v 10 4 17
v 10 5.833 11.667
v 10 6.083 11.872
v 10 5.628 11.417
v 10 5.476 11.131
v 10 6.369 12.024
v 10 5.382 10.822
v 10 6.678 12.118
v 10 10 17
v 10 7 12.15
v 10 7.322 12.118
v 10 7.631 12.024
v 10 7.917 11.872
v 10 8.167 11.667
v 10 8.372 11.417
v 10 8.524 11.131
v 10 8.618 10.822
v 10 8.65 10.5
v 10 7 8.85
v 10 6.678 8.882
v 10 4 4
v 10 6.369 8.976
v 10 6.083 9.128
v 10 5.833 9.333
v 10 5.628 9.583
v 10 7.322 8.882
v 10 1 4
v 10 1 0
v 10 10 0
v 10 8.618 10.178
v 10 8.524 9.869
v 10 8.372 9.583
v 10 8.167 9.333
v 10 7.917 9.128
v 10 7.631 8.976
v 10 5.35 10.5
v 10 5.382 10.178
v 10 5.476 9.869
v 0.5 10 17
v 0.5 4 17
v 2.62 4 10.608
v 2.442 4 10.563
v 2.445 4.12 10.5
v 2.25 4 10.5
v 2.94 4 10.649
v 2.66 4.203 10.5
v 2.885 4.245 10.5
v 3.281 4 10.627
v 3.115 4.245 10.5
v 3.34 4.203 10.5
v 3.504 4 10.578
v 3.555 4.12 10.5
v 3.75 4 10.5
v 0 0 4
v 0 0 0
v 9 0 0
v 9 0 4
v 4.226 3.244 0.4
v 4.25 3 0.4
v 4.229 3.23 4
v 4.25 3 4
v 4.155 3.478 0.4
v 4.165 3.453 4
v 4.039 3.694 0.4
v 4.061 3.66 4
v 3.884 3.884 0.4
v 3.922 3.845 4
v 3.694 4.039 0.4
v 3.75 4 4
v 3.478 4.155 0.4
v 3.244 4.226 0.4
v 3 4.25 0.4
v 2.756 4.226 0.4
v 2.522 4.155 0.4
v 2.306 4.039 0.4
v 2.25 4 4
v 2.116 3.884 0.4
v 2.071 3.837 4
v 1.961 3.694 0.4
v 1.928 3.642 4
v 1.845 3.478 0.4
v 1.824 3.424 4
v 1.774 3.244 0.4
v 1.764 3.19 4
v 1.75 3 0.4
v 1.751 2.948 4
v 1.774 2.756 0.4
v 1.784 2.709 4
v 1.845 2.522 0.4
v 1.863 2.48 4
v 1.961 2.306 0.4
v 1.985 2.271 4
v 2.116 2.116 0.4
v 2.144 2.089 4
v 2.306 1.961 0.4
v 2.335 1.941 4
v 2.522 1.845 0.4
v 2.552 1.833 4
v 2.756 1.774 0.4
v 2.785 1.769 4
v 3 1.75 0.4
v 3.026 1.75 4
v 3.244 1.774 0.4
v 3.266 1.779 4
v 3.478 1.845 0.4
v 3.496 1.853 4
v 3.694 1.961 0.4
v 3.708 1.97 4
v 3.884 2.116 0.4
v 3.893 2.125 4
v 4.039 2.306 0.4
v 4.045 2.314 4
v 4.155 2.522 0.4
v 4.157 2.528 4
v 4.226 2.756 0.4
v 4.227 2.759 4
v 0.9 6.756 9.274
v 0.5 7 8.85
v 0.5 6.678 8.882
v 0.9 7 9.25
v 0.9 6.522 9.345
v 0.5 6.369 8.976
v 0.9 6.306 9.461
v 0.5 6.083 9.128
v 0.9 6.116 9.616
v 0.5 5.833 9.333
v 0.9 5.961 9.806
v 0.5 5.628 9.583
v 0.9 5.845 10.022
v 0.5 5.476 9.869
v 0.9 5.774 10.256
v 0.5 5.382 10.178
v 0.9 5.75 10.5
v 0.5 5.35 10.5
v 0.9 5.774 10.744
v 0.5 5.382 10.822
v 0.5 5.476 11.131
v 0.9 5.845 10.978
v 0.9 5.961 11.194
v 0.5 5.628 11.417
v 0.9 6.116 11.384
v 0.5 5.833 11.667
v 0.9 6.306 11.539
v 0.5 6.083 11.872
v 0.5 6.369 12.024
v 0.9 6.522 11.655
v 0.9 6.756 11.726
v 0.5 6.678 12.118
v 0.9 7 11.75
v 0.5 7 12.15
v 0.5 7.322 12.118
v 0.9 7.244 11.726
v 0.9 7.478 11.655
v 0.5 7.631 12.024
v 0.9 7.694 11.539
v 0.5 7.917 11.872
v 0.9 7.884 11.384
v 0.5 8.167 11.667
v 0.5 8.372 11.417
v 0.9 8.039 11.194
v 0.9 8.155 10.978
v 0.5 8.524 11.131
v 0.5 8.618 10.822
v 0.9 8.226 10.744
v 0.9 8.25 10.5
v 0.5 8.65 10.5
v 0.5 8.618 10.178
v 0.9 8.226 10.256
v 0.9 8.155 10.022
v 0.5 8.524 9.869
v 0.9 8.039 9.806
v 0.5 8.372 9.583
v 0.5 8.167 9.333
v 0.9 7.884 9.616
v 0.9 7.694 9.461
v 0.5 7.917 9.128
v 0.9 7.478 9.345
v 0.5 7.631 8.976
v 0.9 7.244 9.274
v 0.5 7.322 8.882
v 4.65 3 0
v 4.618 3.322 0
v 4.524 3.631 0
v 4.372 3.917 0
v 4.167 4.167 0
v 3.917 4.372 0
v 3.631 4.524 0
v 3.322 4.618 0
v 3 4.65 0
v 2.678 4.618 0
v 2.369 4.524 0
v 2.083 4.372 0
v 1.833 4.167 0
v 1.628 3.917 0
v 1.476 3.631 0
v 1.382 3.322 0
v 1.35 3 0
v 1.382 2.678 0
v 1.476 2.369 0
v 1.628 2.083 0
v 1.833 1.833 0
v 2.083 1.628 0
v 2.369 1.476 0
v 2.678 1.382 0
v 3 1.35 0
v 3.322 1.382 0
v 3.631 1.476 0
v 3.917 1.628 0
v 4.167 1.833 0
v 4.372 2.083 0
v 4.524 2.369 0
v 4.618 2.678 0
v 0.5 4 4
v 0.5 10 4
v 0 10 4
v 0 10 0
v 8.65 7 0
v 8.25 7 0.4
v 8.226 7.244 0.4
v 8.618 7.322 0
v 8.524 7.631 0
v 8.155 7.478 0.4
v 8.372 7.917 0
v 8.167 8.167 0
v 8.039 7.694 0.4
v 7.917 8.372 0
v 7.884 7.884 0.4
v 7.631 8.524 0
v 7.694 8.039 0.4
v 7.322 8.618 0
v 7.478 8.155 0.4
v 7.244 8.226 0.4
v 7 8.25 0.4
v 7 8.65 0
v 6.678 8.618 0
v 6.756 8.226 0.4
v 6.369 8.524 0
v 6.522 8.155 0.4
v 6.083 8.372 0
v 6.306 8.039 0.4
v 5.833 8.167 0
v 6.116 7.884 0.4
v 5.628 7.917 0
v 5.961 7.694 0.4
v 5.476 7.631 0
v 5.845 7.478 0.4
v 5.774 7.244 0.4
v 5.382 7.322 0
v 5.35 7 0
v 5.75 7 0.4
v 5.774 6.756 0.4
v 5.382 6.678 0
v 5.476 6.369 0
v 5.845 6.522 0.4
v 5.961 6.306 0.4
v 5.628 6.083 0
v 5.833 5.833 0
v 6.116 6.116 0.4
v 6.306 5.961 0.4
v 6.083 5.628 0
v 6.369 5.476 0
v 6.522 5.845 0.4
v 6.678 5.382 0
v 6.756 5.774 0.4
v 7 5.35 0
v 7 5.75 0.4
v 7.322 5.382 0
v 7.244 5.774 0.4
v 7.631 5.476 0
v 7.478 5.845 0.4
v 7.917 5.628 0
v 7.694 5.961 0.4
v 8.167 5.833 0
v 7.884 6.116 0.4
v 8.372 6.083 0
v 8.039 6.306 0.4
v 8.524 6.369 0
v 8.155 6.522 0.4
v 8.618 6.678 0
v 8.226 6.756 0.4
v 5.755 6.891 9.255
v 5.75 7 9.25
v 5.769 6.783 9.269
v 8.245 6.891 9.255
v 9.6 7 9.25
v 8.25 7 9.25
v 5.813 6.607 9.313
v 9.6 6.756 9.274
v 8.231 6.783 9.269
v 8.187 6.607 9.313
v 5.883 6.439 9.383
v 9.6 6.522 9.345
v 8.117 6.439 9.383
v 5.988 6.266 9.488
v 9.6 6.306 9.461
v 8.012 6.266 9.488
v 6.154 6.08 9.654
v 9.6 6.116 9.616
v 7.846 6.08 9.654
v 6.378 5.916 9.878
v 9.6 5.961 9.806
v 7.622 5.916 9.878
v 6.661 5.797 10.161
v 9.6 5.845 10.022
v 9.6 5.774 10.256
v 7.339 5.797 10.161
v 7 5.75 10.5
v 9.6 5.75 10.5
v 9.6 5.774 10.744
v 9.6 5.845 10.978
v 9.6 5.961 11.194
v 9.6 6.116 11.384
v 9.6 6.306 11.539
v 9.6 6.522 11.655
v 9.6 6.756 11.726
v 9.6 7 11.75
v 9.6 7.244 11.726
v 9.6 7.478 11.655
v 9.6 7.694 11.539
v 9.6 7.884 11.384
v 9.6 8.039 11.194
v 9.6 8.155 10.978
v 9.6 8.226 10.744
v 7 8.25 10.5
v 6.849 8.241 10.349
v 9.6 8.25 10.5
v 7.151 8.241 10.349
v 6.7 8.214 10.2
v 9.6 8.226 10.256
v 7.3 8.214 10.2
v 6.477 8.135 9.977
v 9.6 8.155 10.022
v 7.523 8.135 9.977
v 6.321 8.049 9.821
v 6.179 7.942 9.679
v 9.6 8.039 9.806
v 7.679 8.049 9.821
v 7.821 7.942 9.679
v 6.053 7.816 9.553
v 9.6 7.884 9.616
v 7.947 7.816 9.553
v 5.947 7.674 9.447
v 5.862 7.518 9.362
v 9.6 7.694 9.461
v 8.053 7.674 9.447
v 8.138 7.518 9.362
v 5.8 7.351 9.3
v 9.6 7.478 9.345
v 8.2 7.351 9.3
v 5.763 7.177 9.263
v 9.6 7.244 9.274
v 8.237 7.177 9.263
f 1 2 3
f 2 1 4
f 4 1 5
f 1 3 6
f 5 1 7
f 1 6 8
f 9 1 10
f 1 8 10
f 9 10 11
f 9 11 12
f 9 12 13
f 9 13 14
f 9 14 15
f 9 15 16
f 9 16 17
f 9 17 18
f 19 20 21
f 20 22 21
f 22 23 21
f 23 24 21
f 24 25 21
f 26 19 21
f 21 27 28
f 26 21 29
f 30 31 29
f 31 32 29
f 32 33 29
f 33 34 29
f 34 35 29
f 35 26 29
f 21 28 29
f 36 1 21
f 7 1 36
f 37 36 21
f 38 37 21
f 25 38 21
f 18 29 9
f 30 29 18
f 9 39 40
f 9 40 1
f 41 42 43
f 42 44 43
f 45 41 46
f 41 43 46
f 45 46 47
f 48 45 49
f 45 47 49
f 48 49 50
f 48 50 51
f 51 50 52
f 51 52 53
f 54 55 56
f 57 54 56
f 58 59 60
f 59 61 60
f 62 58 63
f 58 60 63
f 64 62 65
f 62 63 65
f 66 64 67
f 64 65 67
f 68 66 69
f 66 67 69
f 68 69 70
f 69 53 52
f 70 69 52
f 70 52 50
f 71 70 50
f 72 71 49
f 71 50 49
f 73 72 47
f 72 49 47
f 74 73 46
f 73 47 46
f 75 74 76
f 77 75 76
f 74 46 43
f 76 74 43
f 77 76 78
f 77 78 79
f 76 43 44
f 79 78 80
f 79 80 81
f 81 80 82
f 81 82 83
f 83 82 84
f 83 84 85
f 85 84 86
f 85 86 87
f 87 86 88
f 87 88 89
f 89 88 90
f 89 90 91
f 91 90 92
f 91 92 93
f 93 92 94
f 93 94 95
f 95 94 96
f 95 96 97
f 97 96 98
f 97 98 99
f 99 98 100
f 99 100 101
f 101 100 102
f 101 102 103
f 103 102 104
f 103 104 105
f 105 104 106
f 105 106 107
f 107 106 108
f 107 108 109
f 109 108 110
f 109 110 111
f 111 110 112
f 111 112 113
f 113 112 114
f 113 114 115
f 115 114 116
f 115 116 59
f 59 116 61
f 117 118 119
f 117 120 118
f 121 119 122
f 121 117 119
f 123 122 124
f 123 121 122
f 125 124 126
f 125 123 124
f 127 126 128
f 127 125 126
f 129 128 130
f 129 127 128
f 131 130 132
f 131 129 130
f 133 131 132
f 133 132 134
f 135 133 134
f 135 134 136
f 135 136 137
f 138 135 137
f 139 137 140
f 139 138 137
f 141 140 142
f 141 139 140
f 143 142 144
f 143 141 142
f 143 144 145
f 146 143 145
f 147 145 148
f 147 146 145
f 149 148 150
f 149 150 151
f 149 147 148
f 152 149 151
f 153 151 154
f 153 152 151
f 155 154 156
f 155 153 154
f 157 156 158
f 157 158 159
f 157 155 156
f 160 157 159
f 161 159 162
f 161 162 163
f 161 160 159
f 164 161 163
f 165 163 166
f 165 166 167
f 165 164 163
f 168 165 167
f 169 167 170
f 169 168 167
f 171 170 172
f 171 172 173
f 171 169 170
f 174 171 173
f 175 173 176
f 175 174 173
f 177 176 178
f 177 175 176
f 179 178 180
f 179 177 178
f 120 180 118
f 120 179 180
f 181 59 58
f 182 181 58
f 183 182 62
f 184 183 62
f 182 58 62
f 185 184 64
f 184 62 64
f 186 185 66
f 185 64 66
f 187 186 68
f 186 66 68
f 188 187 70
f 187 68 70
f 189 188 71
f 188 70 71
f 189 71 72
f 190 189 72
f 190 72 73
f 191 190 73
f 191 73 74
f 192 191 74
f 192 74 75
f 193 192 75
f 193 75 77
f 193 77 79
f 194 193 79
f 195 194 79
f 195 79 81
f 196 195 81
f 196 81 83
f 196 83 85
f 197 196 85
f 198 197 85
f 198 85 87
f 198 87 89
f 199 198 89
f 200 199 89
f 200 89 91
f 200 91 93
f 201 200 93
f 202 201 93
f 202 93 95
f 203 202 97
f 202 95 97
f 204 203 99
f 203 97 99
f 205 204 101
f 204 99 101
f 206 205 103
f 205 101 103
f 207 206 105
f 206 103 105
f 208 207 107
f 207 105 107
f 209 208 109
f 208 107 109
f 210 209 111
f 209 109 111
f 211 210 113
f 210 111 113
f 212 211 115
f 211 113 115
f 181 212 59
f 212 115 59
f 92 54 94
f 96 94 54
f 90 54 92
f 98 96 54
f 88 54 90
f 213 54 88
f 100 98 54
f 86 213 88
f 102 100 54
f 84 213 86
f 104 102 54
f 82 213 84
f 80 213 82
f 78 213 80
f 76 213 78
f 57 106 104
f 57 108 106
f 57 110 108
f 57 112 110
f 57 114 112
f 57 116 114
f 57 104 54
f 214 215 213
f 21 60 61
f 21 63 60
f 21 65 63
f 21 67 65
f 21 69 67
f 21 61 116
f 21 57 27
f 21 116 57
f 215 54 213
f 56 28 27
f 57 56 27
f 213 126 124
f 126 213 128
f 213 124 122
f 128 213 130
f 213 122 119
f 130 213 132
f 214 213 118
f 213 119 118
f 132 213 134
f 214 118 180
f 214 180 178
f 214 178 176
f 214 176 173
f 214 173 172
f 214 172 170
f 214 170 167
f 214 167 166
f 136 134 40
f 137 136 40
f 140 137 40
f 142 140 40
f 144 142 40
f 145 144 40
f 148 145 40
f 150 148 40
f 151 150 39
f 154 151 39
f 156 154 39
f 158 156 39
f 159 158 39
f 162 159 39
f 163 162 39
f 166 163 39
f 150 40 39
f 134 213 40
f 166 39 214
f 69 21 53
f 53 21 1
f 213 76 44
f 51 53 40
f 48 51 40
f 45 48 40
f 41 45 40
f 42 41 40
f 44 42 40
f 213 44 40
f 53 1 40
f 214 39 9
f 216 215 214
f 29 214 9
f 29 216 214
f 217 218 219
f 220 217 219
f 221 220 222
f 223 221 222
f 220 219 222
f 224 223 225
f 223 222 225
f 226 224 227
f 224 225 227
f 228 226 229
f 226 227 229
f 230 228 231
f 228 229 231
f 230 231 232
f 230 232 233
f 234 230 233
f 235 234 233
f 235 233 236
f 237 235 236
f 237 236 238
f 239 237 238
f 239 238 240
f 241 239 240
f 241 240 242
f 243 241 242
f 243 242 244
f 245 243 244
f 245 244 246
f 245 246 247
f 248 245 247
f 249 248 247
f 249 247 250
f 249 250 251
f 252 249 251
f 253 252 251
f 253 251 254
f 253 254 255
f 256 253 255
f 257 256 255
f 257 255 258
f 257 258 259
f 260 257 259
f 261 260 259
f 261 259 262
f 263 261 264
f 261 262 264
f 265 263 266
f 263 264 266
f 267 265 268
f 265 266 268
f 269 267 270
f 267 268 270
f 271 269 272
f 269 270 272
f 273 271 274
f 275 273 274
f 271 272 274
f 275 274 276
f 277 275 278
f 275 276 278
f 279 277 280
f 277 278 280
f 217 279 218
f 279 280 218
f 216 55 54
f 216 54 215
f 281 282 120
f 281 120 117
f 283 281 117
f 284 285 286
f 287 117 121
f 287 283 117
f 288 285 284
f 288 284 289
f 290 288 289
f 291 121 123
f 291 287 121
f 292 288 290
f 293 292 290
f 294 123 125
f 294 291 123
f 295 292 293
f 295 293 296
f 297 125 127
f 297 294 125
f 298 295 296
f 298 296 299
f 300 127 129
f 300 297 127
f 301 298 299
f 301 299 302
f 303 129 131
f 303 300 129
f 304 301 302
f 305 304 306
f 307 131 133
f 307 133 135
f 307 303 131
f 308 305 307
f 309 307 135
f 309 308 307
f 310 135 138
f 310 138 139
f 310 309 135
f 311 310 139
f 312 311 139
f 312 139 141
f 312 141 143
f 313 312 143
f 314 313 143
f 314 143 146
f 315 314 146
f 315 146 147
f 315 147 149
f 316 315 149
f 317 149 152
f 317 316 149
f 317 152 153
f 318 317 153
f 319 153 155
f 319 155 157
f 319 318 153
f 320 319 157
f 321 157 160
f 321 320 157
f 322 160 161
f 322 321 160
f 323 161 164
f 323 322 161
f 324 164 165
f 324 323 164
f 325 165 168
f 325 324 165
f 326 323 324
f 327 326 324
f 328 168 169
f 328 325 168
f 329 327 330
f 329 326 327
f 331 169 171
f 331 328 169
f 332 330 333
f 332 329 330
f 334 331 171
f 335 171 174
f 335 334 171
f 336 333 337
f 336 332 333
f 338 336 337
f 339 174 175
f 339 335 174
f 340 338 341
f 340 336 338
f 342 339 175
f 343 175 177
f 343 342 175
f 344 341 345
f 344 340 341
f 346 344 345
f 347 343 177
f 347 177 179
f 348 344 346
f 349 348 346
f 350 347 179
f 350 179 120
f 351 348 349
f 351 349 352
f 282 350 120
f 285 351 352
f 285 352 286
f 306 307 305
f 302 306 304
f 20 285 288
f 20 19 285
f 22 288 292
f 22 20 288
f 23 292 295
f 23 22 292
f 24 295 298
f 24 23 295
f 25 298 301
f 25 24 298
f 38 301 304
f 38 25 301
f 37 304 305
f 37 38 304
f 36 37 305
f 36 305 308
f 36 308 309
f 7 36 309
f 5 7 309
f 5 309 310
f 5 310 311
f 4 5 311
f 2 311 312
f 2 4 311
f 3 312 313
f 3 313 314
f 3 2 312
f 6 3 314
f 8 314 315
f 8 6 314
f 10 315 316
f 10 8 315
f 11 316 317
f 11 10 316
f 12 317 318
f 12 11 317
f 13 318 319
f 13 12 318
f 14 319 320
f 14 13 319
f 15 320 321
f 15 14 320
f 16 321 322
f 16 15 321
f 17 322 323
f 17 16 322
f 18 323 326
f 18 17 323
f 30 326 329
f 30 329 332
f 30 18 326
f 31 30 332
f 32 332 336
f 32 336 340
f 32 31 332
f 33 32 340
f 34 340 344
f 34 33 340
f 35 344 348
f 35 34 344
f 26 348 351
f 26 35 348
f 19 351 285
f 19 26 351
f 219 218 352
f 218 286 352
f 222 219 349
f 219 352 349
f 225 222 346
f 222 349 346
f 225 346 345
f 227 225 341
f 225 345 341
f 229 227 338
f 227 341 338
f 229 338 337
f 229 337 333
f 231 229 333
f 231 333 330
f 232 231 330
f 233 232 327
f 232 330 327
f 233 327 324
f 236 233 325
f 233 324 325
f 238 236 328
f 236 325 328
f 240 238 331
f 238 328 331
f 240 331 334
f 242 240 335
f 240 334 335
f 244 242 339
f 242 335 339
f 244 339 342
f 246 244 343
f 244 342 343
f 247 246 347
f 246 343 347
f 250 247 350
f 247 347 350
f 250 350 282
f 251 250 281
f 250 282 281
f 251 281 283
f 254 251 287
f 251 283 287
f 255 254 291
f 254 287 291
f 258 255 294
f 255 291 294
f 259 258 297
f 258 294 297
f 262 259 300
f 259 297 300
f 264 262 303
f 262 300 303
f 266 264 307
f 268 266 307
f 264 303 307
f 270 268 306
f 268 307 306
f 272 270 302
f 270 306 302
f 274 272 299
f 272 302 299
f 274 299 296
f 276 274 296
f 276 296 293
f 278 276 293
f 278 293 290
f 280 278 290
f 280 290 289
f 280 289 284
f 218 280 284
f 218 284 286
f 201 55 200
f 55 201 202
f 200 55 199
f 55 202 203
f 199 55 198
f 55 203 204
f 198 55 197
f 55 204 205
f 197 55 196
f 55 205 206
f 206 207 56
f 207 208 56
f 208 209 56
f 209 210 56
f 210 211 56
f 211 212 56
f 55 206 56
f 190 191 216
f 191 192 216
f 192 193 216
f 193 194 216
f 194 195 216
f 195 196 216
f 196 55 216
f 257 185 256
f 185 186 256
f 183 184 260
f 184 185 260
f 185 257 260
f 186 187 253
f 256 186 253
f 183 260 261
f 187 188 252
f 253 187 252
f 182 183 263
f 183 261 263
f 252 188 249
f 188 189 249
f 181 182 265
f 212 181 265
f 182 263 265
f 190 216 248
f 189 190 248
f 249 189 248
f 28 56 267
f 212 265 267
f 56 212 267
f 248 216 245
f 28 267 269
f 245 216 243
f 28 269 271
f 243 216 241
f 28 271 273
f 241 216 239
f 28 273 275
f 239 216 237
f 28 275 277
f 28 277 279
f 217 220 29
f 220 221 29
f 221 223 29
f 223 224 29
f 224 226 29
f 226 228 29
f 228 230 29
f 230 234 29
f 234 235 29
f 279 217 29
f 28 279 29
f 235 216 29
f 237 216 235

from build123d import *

# Parameters (mm, degrees)
SKETCH_1_W                  = 10
SKETCH_1_H                  = 10
EXTRUDE_1_DEPTH             = 17
CUT_EXTRUDE_1_DEPTH         = 13
HOLE_WIZARD_M32_D           = 2.5
HOLE_WIZARD_M32_DEPTH       = 10.5
HOLE_WIZARD_M32_CSINK_D     = 3.3
HOLE_WIZARD_M32_CSINK_ANGLE = 90
HOLE_WIZARD_M32_TIP         = 0.751075774
CHAMFER_1_SIZE              = 1


with BuildPart() as part:
    # Эскиз1 → Бобышка-Вытянуть1 (new body)
    with BuildSketch(Plane.XY):
        with Locations((5, 5)):
            Rectangle(SKETCH_1_W, SKETCH_1_H)
    extrude(amount=EXTRUDE_1_DEPTH)

    # Эскиз7 → Вырез-Вытянуть1 (cut)
    with BuildSketch(Plane.XY.offset(17)):
        Polygon((0.5, 4), (0.5, 10), (0, 10), (0, 0), (10, 0), (10, 4), align=None)
    extrude(amount=-CUT_EXTRUDE_1_DEPTH, mode=Mode.SUBTRACT)

    # Эскиз3 → Отверстие обработанное метчиком M31 (revolve, cut)
    with BuildSketch(Plane(origin=(10, 7, 10.5), x_dir=(0, 0, -1), z_dir=(0, 1, 0))):
        Polygon((0, 0), (0, 9.5), (1.65, 9.5), (1.25, 9.1), (1.25, 0.4), (1.65, 0), align=None)
    revolve(axis=Axis((16.35, 7, 10.5), (-1, 0, 0)), mode=Mode.SUBTRACT)

    # Отверстие обработанное метчиком M32
    with Locations(Plane(origin=(0, 0, 0), x_dir=(-1, 0, 0), z_dir=(0, 0, -1))):
        with Locations((-3, 3), (-7, 7)):
            CounterSinkHole(HOLE_WIZARD_M32_D / 2, HOLE_WIZARD_M32_CSINK_D / 2, depth=HOLE_WIZARD_M32_DEPTH, counter_sink_angle=HOLE_WIZARD_M32_CSINK_ANGLE)
            with Locations((0, 0, -(HOLE_WIZARD_M32_DEPTH + HOLE_WIZARD_M32_TIP / 2))):  # 118° drill point
                Cone(0, HOLE_WIZARD_M32_D / 2, HOLE_WIZARD_M32_TIP, mode=Mode.SUBTRACT)

    # Фаска1
    chamfer_1_edges = [part.edges().sort_by_distance(p)[0] for p in [
        (10, 0, 2),
    ]]
    chamfer(chamfer_1_edges, length=CHAMFER_1_SIZE)


solid = part.part
